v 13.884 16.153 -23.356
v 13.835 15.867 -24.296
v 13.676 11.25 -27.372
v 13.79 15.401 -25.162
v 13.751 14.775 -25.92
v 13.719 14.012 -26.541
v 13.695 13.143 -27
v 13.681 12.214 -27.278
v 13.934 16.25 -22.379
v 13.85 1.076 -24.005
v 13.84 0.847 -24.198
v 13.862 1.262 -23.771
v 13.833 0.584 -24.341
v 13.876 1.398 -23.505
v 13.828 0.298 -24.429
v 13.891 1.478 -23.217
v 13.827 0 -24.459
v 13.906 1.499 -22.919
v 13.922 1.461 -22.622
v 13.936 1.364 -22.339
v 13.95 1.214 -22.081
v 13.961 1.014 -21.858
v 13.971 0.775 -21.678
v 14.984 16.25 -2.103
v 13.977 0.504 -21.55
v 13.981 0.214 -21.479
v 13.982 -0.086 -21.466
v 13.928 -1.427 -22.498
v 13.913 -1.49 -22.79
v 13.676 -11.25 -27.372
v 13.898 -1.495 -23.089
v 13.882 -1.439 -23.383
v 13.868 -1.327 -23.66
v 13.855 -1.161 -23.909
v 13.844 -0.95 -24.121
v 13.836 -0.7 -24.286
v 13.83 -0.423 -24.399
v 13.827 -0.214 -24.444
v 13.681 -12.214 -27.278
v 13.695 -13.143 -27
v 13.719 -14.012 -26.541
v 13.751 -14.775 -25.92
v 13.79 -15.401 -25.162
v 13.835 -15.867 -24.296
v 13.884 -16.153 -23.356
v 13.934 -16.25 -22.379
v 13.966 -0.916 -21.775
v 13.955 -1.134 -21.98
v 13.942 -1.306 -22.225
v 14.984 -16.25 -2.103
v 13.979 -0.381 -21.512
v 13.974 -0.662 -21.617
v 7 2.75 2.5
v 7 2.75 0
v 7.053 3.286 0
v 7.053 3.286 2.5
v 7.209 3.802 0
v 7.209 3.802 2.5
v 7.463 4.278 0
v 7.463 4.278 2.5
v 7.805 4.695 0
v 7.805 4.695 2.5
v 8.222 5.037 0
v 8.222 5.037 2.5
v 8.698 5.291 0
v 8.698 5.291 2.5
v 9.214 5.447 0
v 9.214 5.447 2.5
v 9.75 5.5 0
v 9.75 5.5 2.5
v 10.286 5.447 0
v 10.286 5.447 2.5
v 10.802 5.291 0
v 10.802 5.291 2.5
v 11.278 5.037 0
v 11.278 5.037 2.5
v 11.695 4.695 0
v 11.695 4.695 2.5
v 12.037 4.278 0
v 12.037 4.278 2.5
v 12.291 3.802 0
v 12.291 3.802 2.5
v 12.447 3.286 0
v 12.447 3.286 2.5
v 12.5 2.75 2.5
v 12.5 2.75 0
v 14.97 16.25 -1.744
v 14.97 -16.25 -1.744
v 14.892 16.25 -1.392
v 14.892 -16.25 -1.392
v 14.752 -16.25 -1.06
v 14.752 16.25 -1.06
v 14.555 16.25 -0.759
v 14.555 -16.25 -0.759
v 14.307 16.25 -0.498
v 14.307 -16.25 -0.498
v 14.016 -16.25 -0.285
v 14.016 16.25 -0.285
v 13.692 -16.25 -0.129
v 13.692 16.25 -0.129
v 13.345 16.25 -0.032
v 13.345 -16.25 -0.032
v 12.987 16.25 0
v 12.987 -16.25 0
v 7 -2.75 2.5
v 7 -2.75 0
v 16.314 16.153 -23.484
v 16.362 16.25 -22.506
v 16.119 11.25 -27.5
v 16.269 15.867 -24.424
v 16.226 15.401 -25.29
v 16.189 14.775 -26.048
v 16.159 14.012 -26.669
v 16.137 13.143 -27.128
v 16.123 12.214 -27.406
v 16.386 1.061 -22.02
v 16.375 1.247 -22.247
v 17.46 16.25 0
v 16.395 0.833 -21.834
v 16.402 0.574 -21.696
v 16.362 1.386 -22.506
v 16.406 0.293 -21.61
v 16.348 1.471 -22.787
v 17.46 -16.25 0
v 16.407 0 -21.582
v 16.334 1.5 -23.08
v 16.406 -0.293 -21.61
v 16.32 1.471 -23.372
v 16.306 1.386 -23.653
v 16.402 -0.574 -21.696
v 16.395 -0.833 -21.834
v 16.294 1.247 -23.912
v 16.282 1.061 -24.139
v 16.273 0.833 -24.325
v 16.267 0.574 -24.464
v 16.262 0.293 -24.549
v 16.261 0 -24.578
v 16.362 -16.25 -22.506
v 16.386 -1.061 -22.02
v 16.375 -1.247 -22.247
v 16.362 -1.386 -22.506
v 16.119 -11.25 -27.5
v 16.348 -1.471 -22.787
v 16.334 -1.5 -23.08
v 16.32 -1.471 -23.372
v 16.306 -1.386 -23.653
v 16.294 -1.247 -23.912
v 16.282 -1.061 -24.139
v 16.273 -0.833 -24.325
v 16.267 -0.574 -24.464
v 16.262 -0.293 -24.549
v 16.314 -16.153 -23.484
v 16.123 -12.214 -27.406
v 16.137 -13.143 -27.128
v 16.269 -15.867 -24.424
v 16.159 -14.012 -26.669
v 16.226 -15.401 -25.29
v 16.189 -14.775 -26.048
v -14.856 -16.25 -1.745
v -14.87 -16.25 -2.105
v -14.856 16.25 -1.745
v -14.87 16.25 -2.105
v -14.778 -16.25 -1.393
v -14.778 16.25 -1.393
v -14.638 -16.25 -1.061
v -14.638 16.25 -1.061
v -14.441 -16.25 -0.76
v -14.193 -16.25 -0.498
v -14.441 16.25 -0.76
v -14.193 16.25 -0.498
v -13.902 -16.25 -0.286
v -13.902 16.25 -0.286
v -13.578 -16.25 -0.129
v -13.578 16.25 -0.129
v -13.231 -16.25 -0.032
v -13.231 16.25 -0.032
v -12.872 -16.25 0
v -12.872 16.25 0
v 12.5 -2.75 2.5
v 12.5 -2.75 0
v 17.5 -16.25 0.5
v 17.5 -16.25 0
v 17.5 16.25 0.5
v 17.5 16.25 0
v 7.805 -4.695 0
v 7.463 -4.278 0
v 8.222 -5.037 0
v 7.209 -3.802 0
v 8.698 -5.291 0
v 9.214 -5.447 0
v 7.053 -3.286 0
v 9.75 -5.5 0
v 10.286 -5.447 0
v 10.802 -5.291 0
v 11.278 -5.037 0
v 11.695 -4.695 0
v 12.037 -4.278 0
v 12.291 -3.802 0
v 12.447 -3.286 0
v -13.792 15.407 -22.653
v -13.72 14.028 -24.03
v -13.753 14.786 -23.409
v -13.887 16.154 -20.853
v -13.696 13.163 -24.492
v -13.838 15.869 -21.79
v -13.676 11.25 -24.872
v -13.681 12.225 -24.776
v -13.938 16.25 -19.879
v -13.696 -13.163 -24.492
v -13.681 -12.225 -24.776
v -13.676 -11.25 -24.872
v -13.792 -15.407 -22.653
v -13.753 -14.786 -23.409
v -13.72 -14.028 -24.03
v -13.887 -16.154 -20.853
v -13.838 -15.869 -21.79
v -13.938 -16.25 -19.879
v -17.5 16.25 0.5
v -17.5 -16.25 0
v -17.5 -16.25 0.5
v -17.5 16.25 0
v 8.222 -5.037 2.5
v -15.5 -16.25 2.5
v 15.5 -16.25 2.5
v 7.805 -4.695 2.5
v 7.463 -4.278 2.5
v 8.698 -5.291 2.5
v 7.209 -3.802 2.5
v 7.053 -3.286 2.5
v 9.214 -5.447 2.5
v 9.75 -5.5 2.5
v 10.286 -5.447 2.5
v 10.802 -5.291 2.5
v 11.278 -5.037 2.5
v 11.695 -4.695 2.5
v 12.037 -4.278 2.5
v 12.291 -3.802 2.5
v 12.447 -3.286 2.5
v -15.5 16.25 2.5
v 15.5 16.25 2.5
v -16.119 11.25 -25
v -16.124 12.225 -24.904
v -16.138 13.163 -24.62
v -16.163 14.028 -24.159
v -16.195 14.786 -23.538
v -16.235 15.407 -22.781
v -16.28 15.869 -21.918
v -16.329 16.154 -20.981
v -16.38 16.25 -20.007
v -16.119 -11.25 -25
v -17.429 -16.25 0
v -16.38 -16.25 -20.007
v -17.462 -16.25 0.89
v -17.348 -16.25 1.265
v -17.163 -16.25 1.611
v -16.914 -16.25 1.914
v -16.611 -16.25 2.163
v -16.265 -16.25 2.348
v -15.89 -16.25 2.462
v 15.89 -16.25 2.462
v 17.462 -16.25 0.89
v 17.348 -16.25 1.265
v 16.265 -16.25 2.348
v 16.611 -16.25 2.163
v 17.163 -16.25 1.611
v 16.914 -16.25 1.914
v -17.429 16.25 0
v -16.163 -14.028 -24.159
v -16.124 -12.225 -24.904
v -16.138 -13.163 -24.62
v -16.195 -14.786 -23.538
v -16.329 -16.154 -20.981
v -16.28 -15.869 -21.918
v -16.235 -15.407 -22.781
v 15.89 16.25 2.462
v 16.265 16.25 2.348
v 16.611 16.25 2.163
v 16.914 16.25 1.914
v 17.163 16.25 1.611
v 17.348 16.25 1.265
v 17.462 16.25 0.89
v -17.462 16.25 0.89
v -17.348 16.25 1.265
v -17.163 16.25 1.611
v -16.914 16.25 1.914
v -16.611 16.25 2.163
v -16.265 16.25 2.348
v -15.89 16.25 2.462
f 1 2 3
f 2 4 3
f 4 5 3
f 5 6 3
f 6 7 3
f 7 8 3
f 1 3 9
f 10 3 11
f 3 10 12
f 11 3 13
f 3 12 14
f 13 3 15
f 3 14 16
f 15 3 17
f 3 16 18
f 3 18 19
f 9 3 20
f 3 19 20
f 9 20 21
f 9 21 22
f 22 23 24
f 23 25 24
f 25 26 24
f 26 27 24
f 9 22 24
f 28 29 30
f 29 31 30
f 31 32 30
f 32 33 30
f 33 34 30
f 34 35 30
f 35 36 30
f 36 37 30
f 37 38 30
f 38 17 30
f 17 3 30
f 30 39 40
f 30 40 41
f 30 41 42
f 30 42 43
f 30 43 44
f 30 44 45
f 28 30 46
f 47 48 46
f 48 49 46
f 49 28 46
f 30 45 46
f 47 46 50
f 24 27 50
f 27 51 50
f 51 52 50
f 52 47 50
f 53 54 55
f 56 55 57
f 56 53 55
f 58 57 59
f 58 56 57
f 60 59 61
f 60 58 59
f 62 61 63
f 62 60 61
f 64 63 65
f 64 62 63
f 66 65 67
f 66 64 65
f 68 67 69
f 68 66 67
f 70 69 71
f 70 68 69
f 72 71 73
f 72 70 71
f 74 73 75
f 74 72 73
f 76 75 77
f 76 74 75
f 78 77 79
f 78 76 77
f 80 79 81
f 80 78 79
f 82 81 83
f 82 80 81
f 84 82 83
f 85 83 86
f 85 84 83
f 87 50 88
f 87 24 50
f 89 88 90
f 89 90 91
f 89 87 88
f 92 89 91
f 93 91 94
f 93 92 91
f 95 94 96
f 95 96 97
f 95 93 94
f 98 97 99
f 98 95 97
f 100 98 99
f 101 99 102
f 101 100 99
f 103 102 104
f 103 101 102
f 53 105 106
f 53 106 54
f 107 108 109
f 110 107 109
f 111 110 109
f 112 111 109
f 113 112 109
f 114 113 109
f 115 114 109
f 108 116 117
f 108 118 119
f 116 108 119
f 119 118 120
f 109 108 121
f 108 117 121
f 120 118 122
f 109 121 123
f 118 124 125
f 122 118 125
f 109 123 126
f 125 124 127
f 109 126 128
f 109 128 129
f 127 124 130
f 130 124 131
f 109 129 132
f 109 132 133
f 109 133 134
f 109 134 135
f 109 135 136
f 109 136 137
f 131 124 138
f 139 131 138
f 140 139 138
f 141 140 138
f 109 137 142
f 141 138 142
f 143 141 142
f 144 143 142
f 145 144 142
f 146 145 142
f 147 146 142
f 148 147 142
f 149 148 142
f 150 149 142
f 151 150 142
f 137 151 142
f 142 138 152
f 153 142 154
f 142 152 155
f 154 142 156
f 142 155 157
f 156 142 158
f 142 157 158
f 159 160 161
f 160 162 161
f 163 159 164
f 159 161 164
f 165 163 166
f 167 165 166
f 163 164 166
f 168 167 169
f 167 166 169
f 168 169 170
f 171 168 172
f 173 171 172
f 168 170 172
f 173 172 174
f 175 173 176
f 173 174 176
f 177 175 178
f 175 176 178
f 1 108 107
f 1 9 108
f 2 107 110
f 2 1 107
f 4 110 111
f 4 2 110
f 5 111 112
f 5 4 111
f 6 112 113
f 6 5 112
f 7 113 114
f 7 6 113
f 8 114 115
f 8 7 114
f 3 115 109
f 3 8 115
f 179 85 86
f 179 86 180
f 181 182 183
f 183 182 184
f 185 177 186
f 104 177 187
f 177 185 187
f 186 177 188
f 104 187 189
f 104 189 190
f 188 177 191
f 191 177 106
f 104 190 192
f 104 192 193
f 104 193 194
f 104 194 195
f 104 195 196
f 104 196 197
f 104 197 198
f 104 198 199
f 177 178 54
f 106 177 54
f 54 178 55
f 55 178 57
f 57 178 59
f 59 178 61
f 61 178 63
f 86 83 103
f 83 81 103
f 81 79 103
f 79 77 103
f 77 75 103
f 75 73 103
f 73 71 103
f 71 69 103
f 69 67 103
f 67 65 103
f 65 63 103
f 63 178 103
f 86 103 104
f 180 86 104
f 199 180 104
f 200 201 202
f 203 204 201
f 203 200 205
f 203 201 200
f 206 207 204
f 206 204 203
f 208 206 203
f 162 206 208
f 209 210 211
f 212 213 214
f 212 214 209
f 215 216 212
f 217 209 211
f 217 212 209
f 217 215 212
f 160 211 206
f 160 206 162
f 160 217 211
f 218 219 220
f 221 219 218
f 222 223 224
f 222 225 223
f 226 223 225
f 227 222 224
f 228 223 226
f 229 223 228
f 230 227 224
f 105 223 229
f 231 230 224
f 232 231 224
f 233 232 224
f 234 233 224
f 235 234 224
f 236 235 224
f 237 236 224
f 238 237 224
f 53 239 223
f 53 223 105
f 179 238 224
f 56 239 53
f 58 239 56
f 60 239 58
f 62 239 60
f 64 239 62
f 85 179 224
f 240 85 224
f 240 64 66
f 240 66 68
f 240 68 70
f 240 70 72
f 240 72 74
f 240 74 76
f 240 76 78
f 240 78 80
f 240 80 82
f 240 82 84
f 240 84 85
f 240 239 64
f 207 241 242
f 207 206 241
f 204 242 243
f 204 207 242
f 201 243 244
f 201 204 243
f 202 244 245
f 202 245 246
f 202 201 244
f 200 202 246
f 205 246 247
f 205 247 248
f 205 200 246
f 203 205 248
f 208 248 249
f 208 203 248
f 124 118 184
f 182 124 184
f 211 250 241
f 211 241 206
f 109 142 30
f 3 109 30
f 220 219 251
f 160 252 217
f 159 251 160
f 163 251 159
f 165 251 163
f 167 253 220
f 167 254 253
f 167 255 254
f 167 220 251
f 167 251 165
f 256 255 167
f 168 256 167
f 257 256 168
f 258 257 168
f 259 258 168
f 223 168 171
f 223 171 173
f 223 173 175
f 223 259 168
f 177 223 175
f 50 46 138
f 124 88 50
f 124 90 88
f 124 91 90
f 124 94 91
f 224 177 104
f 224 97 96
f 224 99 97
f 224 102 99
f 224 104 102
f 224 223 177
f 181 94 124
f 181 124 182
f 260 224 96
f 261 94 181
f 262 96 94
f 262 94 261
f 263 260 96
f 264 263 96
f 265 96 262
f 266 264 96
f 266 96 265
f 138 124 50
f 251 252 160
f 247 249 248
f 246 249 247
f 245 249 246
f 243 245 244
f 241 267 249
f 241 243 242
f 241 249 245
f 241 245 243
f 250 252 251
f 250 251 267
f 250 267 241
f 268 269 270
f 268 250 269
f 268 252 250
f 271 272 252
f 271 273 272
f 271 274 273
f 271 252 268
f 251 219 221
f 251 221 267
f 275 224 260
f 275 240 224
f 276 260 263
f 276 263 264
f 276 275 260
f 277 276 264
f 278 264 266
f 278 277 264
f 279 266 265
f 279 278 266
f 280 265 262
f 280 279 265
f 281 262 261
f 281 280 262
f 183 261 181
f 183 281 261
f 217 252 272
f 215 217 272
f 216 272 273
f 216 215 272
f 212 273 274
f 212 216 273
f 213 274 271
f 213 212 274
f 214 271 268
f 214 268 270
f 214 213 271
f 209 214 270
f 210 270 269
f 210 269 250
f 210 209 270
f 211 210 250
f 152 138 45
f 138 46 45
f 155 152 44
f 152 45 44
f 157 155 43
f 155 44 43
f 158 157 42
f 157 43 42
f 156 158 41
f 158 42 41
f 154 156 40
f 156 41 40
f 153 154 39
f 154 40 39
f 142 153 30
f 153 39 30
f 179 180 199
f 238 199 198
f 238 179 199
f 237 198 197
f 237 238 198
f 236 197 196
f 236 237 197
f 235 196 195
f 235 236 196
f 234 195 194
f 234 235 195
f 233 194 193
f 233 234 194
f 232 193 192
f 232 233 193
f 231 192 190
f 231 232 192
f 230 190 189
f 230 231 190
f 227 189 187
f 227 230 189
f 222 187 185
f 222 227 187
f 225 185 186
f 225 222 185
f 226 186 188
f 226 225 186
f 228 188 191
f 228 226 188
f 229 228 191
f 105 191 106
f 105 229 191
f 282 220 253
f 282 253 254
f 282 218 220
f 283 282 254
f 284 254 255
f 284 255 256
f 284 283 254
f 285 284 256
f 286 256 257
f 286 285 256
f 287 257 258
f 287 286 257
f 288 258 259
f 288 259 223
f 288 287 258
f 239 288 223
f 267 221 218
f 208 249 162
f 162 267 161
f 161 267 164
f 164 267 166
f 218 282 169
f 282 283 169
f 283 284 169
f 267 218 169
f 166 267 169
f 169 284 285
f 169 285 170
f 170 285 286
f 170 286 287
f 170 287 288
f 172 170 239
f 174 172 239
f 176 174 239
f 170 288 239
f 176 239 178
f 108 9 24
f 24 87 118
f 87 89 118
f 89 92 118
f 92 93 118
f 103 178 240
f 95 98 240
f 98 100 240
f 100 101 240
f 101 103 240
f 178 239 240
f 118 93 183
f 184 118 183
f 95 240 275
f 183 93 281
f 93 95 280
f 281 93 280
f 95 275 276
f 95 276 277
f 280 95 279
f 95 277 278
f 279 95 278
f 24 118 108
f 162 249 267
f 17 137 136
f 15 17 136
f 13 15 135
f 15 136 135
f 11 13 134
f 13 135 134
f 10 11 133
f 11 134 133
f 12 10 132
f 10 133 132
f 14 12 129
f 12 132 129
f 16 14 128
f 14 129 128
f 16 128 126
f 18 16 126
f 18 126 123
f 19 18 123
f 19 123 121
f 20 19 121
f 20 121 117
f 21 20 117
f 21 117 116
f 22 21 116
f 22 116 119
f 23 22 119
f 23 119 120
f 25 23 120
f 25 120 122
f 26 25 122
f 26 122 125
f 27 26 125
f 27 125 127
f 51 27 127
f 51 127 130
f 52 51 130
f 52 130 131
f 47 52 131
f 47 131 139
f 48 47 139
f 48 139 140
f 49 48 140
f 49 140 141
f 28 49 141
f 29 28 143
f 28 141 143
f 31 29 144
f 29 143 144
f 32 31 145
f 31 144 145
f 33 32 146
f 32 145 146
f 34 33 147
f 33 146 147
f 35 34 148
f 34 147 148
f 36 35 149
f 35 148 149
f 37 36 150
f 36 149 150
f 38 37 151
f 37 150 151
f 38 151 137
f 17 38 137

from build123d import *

# Parameters (mm, degrees)
SKETCH_1_W          = 35
SKETCH_1_H          = 32.5
EXTRUDE_1_DEPTH     = 2.5
EXTRUDE_2_DEPTH     = 32.5
FILLET_1_R          = 2
FILLET_2_R          = 5
SKETCH_3_R          = 1.5
CUT_EXTRUDE_1_DEPTH = 10
CUT_EXTRUDE_2_DEPTH = 10


with BuildPart() as part:
    # 草图1 → 凸台-拉伸1 (new body)
    with BuildSketch(Plane.XY):
        Rectangle(SKETCH_1_W, SKETCH_1_H)
    extrude(amount=EXTRUDE_1_DEPTH)

    # 草图2 → 凸台-拉伸2 (add)
    with BuildSketch(Plane.XZ.offset(16.25)):
        Polygon((-13.675929559, -24.871935947), (-14.98280876, 0.054942395), (-17.43216424, 0.054942395), (-16.118570831, -25), align=None)
        Polygon((16.118570831, -27.5), (13.675929559, -27.371935947), (15.108562872, 0.305766553), (17.5, 0.82312635), align=None)
    extrude(amount=-EXTRUDE_2_DEPTH)

    # 圆角1
    fillet_1_edges = [part.edges().sort_by_distance(p)[0] for p in [
        (17.5, 0, 2.5),
        (-14.979928212, 0, 0),
        (15.092736004, 0, 0),
        (-17.5, 0, 2.5),
    ]]
    fillet(fillet_1_edges, radius=FILLET_1_R)

    # 圆角2
    fillet_2_edges = [part.edges().sort_by_distance(p)[0] for p in [
        (-14.897250195, -16.25, -24.935967973),
        (-14.897250195, 16.25, -24.935967973),
        (14.897250195, -16.25, -27.435967973),
        (14.897250195, 16.25, -27.435967973),
    ]]
    fillet(fillet_2_edges, radius=FILLET_2_R)

    # 草图3 → 切除-拉伸1 (cut)
    with BuildSketch(Plane(origin=(17.418416378, 0, -0.849563998), x_dir=(-0.048715984, 0, -0.998812672), z_dir=(0.998812672, 0, -0.048715984))):
        with Locations((22.256634944, 0)):
            Circle(SKETCH_3_R)
    extrude(amount=-CUT_EXTRUDE_1_DEPTH, mode=Mode.SUBTRACT)

    # 草图4 → 切除-拉伸2 (cut)
    with BuildSketch(Plane.XY.offset(2.5)):
        with BuildLine():
            Line((12.5, 2.75), (12.5, -2.75))
            ThreePointArc((12.5, -2.75), (9.75, -5.5), (7, -2.75))
            Line((7, -2.75), (7, 2.75))
            ThreePointArc((7, 2.75), (9.75, 5.5), (12.5, 2.75))
        make_face()
    extrude(amount=-CUT_EXTRUDE_2_DEPTH, mode=Mode.SUBTRACT)


solid = part.part
